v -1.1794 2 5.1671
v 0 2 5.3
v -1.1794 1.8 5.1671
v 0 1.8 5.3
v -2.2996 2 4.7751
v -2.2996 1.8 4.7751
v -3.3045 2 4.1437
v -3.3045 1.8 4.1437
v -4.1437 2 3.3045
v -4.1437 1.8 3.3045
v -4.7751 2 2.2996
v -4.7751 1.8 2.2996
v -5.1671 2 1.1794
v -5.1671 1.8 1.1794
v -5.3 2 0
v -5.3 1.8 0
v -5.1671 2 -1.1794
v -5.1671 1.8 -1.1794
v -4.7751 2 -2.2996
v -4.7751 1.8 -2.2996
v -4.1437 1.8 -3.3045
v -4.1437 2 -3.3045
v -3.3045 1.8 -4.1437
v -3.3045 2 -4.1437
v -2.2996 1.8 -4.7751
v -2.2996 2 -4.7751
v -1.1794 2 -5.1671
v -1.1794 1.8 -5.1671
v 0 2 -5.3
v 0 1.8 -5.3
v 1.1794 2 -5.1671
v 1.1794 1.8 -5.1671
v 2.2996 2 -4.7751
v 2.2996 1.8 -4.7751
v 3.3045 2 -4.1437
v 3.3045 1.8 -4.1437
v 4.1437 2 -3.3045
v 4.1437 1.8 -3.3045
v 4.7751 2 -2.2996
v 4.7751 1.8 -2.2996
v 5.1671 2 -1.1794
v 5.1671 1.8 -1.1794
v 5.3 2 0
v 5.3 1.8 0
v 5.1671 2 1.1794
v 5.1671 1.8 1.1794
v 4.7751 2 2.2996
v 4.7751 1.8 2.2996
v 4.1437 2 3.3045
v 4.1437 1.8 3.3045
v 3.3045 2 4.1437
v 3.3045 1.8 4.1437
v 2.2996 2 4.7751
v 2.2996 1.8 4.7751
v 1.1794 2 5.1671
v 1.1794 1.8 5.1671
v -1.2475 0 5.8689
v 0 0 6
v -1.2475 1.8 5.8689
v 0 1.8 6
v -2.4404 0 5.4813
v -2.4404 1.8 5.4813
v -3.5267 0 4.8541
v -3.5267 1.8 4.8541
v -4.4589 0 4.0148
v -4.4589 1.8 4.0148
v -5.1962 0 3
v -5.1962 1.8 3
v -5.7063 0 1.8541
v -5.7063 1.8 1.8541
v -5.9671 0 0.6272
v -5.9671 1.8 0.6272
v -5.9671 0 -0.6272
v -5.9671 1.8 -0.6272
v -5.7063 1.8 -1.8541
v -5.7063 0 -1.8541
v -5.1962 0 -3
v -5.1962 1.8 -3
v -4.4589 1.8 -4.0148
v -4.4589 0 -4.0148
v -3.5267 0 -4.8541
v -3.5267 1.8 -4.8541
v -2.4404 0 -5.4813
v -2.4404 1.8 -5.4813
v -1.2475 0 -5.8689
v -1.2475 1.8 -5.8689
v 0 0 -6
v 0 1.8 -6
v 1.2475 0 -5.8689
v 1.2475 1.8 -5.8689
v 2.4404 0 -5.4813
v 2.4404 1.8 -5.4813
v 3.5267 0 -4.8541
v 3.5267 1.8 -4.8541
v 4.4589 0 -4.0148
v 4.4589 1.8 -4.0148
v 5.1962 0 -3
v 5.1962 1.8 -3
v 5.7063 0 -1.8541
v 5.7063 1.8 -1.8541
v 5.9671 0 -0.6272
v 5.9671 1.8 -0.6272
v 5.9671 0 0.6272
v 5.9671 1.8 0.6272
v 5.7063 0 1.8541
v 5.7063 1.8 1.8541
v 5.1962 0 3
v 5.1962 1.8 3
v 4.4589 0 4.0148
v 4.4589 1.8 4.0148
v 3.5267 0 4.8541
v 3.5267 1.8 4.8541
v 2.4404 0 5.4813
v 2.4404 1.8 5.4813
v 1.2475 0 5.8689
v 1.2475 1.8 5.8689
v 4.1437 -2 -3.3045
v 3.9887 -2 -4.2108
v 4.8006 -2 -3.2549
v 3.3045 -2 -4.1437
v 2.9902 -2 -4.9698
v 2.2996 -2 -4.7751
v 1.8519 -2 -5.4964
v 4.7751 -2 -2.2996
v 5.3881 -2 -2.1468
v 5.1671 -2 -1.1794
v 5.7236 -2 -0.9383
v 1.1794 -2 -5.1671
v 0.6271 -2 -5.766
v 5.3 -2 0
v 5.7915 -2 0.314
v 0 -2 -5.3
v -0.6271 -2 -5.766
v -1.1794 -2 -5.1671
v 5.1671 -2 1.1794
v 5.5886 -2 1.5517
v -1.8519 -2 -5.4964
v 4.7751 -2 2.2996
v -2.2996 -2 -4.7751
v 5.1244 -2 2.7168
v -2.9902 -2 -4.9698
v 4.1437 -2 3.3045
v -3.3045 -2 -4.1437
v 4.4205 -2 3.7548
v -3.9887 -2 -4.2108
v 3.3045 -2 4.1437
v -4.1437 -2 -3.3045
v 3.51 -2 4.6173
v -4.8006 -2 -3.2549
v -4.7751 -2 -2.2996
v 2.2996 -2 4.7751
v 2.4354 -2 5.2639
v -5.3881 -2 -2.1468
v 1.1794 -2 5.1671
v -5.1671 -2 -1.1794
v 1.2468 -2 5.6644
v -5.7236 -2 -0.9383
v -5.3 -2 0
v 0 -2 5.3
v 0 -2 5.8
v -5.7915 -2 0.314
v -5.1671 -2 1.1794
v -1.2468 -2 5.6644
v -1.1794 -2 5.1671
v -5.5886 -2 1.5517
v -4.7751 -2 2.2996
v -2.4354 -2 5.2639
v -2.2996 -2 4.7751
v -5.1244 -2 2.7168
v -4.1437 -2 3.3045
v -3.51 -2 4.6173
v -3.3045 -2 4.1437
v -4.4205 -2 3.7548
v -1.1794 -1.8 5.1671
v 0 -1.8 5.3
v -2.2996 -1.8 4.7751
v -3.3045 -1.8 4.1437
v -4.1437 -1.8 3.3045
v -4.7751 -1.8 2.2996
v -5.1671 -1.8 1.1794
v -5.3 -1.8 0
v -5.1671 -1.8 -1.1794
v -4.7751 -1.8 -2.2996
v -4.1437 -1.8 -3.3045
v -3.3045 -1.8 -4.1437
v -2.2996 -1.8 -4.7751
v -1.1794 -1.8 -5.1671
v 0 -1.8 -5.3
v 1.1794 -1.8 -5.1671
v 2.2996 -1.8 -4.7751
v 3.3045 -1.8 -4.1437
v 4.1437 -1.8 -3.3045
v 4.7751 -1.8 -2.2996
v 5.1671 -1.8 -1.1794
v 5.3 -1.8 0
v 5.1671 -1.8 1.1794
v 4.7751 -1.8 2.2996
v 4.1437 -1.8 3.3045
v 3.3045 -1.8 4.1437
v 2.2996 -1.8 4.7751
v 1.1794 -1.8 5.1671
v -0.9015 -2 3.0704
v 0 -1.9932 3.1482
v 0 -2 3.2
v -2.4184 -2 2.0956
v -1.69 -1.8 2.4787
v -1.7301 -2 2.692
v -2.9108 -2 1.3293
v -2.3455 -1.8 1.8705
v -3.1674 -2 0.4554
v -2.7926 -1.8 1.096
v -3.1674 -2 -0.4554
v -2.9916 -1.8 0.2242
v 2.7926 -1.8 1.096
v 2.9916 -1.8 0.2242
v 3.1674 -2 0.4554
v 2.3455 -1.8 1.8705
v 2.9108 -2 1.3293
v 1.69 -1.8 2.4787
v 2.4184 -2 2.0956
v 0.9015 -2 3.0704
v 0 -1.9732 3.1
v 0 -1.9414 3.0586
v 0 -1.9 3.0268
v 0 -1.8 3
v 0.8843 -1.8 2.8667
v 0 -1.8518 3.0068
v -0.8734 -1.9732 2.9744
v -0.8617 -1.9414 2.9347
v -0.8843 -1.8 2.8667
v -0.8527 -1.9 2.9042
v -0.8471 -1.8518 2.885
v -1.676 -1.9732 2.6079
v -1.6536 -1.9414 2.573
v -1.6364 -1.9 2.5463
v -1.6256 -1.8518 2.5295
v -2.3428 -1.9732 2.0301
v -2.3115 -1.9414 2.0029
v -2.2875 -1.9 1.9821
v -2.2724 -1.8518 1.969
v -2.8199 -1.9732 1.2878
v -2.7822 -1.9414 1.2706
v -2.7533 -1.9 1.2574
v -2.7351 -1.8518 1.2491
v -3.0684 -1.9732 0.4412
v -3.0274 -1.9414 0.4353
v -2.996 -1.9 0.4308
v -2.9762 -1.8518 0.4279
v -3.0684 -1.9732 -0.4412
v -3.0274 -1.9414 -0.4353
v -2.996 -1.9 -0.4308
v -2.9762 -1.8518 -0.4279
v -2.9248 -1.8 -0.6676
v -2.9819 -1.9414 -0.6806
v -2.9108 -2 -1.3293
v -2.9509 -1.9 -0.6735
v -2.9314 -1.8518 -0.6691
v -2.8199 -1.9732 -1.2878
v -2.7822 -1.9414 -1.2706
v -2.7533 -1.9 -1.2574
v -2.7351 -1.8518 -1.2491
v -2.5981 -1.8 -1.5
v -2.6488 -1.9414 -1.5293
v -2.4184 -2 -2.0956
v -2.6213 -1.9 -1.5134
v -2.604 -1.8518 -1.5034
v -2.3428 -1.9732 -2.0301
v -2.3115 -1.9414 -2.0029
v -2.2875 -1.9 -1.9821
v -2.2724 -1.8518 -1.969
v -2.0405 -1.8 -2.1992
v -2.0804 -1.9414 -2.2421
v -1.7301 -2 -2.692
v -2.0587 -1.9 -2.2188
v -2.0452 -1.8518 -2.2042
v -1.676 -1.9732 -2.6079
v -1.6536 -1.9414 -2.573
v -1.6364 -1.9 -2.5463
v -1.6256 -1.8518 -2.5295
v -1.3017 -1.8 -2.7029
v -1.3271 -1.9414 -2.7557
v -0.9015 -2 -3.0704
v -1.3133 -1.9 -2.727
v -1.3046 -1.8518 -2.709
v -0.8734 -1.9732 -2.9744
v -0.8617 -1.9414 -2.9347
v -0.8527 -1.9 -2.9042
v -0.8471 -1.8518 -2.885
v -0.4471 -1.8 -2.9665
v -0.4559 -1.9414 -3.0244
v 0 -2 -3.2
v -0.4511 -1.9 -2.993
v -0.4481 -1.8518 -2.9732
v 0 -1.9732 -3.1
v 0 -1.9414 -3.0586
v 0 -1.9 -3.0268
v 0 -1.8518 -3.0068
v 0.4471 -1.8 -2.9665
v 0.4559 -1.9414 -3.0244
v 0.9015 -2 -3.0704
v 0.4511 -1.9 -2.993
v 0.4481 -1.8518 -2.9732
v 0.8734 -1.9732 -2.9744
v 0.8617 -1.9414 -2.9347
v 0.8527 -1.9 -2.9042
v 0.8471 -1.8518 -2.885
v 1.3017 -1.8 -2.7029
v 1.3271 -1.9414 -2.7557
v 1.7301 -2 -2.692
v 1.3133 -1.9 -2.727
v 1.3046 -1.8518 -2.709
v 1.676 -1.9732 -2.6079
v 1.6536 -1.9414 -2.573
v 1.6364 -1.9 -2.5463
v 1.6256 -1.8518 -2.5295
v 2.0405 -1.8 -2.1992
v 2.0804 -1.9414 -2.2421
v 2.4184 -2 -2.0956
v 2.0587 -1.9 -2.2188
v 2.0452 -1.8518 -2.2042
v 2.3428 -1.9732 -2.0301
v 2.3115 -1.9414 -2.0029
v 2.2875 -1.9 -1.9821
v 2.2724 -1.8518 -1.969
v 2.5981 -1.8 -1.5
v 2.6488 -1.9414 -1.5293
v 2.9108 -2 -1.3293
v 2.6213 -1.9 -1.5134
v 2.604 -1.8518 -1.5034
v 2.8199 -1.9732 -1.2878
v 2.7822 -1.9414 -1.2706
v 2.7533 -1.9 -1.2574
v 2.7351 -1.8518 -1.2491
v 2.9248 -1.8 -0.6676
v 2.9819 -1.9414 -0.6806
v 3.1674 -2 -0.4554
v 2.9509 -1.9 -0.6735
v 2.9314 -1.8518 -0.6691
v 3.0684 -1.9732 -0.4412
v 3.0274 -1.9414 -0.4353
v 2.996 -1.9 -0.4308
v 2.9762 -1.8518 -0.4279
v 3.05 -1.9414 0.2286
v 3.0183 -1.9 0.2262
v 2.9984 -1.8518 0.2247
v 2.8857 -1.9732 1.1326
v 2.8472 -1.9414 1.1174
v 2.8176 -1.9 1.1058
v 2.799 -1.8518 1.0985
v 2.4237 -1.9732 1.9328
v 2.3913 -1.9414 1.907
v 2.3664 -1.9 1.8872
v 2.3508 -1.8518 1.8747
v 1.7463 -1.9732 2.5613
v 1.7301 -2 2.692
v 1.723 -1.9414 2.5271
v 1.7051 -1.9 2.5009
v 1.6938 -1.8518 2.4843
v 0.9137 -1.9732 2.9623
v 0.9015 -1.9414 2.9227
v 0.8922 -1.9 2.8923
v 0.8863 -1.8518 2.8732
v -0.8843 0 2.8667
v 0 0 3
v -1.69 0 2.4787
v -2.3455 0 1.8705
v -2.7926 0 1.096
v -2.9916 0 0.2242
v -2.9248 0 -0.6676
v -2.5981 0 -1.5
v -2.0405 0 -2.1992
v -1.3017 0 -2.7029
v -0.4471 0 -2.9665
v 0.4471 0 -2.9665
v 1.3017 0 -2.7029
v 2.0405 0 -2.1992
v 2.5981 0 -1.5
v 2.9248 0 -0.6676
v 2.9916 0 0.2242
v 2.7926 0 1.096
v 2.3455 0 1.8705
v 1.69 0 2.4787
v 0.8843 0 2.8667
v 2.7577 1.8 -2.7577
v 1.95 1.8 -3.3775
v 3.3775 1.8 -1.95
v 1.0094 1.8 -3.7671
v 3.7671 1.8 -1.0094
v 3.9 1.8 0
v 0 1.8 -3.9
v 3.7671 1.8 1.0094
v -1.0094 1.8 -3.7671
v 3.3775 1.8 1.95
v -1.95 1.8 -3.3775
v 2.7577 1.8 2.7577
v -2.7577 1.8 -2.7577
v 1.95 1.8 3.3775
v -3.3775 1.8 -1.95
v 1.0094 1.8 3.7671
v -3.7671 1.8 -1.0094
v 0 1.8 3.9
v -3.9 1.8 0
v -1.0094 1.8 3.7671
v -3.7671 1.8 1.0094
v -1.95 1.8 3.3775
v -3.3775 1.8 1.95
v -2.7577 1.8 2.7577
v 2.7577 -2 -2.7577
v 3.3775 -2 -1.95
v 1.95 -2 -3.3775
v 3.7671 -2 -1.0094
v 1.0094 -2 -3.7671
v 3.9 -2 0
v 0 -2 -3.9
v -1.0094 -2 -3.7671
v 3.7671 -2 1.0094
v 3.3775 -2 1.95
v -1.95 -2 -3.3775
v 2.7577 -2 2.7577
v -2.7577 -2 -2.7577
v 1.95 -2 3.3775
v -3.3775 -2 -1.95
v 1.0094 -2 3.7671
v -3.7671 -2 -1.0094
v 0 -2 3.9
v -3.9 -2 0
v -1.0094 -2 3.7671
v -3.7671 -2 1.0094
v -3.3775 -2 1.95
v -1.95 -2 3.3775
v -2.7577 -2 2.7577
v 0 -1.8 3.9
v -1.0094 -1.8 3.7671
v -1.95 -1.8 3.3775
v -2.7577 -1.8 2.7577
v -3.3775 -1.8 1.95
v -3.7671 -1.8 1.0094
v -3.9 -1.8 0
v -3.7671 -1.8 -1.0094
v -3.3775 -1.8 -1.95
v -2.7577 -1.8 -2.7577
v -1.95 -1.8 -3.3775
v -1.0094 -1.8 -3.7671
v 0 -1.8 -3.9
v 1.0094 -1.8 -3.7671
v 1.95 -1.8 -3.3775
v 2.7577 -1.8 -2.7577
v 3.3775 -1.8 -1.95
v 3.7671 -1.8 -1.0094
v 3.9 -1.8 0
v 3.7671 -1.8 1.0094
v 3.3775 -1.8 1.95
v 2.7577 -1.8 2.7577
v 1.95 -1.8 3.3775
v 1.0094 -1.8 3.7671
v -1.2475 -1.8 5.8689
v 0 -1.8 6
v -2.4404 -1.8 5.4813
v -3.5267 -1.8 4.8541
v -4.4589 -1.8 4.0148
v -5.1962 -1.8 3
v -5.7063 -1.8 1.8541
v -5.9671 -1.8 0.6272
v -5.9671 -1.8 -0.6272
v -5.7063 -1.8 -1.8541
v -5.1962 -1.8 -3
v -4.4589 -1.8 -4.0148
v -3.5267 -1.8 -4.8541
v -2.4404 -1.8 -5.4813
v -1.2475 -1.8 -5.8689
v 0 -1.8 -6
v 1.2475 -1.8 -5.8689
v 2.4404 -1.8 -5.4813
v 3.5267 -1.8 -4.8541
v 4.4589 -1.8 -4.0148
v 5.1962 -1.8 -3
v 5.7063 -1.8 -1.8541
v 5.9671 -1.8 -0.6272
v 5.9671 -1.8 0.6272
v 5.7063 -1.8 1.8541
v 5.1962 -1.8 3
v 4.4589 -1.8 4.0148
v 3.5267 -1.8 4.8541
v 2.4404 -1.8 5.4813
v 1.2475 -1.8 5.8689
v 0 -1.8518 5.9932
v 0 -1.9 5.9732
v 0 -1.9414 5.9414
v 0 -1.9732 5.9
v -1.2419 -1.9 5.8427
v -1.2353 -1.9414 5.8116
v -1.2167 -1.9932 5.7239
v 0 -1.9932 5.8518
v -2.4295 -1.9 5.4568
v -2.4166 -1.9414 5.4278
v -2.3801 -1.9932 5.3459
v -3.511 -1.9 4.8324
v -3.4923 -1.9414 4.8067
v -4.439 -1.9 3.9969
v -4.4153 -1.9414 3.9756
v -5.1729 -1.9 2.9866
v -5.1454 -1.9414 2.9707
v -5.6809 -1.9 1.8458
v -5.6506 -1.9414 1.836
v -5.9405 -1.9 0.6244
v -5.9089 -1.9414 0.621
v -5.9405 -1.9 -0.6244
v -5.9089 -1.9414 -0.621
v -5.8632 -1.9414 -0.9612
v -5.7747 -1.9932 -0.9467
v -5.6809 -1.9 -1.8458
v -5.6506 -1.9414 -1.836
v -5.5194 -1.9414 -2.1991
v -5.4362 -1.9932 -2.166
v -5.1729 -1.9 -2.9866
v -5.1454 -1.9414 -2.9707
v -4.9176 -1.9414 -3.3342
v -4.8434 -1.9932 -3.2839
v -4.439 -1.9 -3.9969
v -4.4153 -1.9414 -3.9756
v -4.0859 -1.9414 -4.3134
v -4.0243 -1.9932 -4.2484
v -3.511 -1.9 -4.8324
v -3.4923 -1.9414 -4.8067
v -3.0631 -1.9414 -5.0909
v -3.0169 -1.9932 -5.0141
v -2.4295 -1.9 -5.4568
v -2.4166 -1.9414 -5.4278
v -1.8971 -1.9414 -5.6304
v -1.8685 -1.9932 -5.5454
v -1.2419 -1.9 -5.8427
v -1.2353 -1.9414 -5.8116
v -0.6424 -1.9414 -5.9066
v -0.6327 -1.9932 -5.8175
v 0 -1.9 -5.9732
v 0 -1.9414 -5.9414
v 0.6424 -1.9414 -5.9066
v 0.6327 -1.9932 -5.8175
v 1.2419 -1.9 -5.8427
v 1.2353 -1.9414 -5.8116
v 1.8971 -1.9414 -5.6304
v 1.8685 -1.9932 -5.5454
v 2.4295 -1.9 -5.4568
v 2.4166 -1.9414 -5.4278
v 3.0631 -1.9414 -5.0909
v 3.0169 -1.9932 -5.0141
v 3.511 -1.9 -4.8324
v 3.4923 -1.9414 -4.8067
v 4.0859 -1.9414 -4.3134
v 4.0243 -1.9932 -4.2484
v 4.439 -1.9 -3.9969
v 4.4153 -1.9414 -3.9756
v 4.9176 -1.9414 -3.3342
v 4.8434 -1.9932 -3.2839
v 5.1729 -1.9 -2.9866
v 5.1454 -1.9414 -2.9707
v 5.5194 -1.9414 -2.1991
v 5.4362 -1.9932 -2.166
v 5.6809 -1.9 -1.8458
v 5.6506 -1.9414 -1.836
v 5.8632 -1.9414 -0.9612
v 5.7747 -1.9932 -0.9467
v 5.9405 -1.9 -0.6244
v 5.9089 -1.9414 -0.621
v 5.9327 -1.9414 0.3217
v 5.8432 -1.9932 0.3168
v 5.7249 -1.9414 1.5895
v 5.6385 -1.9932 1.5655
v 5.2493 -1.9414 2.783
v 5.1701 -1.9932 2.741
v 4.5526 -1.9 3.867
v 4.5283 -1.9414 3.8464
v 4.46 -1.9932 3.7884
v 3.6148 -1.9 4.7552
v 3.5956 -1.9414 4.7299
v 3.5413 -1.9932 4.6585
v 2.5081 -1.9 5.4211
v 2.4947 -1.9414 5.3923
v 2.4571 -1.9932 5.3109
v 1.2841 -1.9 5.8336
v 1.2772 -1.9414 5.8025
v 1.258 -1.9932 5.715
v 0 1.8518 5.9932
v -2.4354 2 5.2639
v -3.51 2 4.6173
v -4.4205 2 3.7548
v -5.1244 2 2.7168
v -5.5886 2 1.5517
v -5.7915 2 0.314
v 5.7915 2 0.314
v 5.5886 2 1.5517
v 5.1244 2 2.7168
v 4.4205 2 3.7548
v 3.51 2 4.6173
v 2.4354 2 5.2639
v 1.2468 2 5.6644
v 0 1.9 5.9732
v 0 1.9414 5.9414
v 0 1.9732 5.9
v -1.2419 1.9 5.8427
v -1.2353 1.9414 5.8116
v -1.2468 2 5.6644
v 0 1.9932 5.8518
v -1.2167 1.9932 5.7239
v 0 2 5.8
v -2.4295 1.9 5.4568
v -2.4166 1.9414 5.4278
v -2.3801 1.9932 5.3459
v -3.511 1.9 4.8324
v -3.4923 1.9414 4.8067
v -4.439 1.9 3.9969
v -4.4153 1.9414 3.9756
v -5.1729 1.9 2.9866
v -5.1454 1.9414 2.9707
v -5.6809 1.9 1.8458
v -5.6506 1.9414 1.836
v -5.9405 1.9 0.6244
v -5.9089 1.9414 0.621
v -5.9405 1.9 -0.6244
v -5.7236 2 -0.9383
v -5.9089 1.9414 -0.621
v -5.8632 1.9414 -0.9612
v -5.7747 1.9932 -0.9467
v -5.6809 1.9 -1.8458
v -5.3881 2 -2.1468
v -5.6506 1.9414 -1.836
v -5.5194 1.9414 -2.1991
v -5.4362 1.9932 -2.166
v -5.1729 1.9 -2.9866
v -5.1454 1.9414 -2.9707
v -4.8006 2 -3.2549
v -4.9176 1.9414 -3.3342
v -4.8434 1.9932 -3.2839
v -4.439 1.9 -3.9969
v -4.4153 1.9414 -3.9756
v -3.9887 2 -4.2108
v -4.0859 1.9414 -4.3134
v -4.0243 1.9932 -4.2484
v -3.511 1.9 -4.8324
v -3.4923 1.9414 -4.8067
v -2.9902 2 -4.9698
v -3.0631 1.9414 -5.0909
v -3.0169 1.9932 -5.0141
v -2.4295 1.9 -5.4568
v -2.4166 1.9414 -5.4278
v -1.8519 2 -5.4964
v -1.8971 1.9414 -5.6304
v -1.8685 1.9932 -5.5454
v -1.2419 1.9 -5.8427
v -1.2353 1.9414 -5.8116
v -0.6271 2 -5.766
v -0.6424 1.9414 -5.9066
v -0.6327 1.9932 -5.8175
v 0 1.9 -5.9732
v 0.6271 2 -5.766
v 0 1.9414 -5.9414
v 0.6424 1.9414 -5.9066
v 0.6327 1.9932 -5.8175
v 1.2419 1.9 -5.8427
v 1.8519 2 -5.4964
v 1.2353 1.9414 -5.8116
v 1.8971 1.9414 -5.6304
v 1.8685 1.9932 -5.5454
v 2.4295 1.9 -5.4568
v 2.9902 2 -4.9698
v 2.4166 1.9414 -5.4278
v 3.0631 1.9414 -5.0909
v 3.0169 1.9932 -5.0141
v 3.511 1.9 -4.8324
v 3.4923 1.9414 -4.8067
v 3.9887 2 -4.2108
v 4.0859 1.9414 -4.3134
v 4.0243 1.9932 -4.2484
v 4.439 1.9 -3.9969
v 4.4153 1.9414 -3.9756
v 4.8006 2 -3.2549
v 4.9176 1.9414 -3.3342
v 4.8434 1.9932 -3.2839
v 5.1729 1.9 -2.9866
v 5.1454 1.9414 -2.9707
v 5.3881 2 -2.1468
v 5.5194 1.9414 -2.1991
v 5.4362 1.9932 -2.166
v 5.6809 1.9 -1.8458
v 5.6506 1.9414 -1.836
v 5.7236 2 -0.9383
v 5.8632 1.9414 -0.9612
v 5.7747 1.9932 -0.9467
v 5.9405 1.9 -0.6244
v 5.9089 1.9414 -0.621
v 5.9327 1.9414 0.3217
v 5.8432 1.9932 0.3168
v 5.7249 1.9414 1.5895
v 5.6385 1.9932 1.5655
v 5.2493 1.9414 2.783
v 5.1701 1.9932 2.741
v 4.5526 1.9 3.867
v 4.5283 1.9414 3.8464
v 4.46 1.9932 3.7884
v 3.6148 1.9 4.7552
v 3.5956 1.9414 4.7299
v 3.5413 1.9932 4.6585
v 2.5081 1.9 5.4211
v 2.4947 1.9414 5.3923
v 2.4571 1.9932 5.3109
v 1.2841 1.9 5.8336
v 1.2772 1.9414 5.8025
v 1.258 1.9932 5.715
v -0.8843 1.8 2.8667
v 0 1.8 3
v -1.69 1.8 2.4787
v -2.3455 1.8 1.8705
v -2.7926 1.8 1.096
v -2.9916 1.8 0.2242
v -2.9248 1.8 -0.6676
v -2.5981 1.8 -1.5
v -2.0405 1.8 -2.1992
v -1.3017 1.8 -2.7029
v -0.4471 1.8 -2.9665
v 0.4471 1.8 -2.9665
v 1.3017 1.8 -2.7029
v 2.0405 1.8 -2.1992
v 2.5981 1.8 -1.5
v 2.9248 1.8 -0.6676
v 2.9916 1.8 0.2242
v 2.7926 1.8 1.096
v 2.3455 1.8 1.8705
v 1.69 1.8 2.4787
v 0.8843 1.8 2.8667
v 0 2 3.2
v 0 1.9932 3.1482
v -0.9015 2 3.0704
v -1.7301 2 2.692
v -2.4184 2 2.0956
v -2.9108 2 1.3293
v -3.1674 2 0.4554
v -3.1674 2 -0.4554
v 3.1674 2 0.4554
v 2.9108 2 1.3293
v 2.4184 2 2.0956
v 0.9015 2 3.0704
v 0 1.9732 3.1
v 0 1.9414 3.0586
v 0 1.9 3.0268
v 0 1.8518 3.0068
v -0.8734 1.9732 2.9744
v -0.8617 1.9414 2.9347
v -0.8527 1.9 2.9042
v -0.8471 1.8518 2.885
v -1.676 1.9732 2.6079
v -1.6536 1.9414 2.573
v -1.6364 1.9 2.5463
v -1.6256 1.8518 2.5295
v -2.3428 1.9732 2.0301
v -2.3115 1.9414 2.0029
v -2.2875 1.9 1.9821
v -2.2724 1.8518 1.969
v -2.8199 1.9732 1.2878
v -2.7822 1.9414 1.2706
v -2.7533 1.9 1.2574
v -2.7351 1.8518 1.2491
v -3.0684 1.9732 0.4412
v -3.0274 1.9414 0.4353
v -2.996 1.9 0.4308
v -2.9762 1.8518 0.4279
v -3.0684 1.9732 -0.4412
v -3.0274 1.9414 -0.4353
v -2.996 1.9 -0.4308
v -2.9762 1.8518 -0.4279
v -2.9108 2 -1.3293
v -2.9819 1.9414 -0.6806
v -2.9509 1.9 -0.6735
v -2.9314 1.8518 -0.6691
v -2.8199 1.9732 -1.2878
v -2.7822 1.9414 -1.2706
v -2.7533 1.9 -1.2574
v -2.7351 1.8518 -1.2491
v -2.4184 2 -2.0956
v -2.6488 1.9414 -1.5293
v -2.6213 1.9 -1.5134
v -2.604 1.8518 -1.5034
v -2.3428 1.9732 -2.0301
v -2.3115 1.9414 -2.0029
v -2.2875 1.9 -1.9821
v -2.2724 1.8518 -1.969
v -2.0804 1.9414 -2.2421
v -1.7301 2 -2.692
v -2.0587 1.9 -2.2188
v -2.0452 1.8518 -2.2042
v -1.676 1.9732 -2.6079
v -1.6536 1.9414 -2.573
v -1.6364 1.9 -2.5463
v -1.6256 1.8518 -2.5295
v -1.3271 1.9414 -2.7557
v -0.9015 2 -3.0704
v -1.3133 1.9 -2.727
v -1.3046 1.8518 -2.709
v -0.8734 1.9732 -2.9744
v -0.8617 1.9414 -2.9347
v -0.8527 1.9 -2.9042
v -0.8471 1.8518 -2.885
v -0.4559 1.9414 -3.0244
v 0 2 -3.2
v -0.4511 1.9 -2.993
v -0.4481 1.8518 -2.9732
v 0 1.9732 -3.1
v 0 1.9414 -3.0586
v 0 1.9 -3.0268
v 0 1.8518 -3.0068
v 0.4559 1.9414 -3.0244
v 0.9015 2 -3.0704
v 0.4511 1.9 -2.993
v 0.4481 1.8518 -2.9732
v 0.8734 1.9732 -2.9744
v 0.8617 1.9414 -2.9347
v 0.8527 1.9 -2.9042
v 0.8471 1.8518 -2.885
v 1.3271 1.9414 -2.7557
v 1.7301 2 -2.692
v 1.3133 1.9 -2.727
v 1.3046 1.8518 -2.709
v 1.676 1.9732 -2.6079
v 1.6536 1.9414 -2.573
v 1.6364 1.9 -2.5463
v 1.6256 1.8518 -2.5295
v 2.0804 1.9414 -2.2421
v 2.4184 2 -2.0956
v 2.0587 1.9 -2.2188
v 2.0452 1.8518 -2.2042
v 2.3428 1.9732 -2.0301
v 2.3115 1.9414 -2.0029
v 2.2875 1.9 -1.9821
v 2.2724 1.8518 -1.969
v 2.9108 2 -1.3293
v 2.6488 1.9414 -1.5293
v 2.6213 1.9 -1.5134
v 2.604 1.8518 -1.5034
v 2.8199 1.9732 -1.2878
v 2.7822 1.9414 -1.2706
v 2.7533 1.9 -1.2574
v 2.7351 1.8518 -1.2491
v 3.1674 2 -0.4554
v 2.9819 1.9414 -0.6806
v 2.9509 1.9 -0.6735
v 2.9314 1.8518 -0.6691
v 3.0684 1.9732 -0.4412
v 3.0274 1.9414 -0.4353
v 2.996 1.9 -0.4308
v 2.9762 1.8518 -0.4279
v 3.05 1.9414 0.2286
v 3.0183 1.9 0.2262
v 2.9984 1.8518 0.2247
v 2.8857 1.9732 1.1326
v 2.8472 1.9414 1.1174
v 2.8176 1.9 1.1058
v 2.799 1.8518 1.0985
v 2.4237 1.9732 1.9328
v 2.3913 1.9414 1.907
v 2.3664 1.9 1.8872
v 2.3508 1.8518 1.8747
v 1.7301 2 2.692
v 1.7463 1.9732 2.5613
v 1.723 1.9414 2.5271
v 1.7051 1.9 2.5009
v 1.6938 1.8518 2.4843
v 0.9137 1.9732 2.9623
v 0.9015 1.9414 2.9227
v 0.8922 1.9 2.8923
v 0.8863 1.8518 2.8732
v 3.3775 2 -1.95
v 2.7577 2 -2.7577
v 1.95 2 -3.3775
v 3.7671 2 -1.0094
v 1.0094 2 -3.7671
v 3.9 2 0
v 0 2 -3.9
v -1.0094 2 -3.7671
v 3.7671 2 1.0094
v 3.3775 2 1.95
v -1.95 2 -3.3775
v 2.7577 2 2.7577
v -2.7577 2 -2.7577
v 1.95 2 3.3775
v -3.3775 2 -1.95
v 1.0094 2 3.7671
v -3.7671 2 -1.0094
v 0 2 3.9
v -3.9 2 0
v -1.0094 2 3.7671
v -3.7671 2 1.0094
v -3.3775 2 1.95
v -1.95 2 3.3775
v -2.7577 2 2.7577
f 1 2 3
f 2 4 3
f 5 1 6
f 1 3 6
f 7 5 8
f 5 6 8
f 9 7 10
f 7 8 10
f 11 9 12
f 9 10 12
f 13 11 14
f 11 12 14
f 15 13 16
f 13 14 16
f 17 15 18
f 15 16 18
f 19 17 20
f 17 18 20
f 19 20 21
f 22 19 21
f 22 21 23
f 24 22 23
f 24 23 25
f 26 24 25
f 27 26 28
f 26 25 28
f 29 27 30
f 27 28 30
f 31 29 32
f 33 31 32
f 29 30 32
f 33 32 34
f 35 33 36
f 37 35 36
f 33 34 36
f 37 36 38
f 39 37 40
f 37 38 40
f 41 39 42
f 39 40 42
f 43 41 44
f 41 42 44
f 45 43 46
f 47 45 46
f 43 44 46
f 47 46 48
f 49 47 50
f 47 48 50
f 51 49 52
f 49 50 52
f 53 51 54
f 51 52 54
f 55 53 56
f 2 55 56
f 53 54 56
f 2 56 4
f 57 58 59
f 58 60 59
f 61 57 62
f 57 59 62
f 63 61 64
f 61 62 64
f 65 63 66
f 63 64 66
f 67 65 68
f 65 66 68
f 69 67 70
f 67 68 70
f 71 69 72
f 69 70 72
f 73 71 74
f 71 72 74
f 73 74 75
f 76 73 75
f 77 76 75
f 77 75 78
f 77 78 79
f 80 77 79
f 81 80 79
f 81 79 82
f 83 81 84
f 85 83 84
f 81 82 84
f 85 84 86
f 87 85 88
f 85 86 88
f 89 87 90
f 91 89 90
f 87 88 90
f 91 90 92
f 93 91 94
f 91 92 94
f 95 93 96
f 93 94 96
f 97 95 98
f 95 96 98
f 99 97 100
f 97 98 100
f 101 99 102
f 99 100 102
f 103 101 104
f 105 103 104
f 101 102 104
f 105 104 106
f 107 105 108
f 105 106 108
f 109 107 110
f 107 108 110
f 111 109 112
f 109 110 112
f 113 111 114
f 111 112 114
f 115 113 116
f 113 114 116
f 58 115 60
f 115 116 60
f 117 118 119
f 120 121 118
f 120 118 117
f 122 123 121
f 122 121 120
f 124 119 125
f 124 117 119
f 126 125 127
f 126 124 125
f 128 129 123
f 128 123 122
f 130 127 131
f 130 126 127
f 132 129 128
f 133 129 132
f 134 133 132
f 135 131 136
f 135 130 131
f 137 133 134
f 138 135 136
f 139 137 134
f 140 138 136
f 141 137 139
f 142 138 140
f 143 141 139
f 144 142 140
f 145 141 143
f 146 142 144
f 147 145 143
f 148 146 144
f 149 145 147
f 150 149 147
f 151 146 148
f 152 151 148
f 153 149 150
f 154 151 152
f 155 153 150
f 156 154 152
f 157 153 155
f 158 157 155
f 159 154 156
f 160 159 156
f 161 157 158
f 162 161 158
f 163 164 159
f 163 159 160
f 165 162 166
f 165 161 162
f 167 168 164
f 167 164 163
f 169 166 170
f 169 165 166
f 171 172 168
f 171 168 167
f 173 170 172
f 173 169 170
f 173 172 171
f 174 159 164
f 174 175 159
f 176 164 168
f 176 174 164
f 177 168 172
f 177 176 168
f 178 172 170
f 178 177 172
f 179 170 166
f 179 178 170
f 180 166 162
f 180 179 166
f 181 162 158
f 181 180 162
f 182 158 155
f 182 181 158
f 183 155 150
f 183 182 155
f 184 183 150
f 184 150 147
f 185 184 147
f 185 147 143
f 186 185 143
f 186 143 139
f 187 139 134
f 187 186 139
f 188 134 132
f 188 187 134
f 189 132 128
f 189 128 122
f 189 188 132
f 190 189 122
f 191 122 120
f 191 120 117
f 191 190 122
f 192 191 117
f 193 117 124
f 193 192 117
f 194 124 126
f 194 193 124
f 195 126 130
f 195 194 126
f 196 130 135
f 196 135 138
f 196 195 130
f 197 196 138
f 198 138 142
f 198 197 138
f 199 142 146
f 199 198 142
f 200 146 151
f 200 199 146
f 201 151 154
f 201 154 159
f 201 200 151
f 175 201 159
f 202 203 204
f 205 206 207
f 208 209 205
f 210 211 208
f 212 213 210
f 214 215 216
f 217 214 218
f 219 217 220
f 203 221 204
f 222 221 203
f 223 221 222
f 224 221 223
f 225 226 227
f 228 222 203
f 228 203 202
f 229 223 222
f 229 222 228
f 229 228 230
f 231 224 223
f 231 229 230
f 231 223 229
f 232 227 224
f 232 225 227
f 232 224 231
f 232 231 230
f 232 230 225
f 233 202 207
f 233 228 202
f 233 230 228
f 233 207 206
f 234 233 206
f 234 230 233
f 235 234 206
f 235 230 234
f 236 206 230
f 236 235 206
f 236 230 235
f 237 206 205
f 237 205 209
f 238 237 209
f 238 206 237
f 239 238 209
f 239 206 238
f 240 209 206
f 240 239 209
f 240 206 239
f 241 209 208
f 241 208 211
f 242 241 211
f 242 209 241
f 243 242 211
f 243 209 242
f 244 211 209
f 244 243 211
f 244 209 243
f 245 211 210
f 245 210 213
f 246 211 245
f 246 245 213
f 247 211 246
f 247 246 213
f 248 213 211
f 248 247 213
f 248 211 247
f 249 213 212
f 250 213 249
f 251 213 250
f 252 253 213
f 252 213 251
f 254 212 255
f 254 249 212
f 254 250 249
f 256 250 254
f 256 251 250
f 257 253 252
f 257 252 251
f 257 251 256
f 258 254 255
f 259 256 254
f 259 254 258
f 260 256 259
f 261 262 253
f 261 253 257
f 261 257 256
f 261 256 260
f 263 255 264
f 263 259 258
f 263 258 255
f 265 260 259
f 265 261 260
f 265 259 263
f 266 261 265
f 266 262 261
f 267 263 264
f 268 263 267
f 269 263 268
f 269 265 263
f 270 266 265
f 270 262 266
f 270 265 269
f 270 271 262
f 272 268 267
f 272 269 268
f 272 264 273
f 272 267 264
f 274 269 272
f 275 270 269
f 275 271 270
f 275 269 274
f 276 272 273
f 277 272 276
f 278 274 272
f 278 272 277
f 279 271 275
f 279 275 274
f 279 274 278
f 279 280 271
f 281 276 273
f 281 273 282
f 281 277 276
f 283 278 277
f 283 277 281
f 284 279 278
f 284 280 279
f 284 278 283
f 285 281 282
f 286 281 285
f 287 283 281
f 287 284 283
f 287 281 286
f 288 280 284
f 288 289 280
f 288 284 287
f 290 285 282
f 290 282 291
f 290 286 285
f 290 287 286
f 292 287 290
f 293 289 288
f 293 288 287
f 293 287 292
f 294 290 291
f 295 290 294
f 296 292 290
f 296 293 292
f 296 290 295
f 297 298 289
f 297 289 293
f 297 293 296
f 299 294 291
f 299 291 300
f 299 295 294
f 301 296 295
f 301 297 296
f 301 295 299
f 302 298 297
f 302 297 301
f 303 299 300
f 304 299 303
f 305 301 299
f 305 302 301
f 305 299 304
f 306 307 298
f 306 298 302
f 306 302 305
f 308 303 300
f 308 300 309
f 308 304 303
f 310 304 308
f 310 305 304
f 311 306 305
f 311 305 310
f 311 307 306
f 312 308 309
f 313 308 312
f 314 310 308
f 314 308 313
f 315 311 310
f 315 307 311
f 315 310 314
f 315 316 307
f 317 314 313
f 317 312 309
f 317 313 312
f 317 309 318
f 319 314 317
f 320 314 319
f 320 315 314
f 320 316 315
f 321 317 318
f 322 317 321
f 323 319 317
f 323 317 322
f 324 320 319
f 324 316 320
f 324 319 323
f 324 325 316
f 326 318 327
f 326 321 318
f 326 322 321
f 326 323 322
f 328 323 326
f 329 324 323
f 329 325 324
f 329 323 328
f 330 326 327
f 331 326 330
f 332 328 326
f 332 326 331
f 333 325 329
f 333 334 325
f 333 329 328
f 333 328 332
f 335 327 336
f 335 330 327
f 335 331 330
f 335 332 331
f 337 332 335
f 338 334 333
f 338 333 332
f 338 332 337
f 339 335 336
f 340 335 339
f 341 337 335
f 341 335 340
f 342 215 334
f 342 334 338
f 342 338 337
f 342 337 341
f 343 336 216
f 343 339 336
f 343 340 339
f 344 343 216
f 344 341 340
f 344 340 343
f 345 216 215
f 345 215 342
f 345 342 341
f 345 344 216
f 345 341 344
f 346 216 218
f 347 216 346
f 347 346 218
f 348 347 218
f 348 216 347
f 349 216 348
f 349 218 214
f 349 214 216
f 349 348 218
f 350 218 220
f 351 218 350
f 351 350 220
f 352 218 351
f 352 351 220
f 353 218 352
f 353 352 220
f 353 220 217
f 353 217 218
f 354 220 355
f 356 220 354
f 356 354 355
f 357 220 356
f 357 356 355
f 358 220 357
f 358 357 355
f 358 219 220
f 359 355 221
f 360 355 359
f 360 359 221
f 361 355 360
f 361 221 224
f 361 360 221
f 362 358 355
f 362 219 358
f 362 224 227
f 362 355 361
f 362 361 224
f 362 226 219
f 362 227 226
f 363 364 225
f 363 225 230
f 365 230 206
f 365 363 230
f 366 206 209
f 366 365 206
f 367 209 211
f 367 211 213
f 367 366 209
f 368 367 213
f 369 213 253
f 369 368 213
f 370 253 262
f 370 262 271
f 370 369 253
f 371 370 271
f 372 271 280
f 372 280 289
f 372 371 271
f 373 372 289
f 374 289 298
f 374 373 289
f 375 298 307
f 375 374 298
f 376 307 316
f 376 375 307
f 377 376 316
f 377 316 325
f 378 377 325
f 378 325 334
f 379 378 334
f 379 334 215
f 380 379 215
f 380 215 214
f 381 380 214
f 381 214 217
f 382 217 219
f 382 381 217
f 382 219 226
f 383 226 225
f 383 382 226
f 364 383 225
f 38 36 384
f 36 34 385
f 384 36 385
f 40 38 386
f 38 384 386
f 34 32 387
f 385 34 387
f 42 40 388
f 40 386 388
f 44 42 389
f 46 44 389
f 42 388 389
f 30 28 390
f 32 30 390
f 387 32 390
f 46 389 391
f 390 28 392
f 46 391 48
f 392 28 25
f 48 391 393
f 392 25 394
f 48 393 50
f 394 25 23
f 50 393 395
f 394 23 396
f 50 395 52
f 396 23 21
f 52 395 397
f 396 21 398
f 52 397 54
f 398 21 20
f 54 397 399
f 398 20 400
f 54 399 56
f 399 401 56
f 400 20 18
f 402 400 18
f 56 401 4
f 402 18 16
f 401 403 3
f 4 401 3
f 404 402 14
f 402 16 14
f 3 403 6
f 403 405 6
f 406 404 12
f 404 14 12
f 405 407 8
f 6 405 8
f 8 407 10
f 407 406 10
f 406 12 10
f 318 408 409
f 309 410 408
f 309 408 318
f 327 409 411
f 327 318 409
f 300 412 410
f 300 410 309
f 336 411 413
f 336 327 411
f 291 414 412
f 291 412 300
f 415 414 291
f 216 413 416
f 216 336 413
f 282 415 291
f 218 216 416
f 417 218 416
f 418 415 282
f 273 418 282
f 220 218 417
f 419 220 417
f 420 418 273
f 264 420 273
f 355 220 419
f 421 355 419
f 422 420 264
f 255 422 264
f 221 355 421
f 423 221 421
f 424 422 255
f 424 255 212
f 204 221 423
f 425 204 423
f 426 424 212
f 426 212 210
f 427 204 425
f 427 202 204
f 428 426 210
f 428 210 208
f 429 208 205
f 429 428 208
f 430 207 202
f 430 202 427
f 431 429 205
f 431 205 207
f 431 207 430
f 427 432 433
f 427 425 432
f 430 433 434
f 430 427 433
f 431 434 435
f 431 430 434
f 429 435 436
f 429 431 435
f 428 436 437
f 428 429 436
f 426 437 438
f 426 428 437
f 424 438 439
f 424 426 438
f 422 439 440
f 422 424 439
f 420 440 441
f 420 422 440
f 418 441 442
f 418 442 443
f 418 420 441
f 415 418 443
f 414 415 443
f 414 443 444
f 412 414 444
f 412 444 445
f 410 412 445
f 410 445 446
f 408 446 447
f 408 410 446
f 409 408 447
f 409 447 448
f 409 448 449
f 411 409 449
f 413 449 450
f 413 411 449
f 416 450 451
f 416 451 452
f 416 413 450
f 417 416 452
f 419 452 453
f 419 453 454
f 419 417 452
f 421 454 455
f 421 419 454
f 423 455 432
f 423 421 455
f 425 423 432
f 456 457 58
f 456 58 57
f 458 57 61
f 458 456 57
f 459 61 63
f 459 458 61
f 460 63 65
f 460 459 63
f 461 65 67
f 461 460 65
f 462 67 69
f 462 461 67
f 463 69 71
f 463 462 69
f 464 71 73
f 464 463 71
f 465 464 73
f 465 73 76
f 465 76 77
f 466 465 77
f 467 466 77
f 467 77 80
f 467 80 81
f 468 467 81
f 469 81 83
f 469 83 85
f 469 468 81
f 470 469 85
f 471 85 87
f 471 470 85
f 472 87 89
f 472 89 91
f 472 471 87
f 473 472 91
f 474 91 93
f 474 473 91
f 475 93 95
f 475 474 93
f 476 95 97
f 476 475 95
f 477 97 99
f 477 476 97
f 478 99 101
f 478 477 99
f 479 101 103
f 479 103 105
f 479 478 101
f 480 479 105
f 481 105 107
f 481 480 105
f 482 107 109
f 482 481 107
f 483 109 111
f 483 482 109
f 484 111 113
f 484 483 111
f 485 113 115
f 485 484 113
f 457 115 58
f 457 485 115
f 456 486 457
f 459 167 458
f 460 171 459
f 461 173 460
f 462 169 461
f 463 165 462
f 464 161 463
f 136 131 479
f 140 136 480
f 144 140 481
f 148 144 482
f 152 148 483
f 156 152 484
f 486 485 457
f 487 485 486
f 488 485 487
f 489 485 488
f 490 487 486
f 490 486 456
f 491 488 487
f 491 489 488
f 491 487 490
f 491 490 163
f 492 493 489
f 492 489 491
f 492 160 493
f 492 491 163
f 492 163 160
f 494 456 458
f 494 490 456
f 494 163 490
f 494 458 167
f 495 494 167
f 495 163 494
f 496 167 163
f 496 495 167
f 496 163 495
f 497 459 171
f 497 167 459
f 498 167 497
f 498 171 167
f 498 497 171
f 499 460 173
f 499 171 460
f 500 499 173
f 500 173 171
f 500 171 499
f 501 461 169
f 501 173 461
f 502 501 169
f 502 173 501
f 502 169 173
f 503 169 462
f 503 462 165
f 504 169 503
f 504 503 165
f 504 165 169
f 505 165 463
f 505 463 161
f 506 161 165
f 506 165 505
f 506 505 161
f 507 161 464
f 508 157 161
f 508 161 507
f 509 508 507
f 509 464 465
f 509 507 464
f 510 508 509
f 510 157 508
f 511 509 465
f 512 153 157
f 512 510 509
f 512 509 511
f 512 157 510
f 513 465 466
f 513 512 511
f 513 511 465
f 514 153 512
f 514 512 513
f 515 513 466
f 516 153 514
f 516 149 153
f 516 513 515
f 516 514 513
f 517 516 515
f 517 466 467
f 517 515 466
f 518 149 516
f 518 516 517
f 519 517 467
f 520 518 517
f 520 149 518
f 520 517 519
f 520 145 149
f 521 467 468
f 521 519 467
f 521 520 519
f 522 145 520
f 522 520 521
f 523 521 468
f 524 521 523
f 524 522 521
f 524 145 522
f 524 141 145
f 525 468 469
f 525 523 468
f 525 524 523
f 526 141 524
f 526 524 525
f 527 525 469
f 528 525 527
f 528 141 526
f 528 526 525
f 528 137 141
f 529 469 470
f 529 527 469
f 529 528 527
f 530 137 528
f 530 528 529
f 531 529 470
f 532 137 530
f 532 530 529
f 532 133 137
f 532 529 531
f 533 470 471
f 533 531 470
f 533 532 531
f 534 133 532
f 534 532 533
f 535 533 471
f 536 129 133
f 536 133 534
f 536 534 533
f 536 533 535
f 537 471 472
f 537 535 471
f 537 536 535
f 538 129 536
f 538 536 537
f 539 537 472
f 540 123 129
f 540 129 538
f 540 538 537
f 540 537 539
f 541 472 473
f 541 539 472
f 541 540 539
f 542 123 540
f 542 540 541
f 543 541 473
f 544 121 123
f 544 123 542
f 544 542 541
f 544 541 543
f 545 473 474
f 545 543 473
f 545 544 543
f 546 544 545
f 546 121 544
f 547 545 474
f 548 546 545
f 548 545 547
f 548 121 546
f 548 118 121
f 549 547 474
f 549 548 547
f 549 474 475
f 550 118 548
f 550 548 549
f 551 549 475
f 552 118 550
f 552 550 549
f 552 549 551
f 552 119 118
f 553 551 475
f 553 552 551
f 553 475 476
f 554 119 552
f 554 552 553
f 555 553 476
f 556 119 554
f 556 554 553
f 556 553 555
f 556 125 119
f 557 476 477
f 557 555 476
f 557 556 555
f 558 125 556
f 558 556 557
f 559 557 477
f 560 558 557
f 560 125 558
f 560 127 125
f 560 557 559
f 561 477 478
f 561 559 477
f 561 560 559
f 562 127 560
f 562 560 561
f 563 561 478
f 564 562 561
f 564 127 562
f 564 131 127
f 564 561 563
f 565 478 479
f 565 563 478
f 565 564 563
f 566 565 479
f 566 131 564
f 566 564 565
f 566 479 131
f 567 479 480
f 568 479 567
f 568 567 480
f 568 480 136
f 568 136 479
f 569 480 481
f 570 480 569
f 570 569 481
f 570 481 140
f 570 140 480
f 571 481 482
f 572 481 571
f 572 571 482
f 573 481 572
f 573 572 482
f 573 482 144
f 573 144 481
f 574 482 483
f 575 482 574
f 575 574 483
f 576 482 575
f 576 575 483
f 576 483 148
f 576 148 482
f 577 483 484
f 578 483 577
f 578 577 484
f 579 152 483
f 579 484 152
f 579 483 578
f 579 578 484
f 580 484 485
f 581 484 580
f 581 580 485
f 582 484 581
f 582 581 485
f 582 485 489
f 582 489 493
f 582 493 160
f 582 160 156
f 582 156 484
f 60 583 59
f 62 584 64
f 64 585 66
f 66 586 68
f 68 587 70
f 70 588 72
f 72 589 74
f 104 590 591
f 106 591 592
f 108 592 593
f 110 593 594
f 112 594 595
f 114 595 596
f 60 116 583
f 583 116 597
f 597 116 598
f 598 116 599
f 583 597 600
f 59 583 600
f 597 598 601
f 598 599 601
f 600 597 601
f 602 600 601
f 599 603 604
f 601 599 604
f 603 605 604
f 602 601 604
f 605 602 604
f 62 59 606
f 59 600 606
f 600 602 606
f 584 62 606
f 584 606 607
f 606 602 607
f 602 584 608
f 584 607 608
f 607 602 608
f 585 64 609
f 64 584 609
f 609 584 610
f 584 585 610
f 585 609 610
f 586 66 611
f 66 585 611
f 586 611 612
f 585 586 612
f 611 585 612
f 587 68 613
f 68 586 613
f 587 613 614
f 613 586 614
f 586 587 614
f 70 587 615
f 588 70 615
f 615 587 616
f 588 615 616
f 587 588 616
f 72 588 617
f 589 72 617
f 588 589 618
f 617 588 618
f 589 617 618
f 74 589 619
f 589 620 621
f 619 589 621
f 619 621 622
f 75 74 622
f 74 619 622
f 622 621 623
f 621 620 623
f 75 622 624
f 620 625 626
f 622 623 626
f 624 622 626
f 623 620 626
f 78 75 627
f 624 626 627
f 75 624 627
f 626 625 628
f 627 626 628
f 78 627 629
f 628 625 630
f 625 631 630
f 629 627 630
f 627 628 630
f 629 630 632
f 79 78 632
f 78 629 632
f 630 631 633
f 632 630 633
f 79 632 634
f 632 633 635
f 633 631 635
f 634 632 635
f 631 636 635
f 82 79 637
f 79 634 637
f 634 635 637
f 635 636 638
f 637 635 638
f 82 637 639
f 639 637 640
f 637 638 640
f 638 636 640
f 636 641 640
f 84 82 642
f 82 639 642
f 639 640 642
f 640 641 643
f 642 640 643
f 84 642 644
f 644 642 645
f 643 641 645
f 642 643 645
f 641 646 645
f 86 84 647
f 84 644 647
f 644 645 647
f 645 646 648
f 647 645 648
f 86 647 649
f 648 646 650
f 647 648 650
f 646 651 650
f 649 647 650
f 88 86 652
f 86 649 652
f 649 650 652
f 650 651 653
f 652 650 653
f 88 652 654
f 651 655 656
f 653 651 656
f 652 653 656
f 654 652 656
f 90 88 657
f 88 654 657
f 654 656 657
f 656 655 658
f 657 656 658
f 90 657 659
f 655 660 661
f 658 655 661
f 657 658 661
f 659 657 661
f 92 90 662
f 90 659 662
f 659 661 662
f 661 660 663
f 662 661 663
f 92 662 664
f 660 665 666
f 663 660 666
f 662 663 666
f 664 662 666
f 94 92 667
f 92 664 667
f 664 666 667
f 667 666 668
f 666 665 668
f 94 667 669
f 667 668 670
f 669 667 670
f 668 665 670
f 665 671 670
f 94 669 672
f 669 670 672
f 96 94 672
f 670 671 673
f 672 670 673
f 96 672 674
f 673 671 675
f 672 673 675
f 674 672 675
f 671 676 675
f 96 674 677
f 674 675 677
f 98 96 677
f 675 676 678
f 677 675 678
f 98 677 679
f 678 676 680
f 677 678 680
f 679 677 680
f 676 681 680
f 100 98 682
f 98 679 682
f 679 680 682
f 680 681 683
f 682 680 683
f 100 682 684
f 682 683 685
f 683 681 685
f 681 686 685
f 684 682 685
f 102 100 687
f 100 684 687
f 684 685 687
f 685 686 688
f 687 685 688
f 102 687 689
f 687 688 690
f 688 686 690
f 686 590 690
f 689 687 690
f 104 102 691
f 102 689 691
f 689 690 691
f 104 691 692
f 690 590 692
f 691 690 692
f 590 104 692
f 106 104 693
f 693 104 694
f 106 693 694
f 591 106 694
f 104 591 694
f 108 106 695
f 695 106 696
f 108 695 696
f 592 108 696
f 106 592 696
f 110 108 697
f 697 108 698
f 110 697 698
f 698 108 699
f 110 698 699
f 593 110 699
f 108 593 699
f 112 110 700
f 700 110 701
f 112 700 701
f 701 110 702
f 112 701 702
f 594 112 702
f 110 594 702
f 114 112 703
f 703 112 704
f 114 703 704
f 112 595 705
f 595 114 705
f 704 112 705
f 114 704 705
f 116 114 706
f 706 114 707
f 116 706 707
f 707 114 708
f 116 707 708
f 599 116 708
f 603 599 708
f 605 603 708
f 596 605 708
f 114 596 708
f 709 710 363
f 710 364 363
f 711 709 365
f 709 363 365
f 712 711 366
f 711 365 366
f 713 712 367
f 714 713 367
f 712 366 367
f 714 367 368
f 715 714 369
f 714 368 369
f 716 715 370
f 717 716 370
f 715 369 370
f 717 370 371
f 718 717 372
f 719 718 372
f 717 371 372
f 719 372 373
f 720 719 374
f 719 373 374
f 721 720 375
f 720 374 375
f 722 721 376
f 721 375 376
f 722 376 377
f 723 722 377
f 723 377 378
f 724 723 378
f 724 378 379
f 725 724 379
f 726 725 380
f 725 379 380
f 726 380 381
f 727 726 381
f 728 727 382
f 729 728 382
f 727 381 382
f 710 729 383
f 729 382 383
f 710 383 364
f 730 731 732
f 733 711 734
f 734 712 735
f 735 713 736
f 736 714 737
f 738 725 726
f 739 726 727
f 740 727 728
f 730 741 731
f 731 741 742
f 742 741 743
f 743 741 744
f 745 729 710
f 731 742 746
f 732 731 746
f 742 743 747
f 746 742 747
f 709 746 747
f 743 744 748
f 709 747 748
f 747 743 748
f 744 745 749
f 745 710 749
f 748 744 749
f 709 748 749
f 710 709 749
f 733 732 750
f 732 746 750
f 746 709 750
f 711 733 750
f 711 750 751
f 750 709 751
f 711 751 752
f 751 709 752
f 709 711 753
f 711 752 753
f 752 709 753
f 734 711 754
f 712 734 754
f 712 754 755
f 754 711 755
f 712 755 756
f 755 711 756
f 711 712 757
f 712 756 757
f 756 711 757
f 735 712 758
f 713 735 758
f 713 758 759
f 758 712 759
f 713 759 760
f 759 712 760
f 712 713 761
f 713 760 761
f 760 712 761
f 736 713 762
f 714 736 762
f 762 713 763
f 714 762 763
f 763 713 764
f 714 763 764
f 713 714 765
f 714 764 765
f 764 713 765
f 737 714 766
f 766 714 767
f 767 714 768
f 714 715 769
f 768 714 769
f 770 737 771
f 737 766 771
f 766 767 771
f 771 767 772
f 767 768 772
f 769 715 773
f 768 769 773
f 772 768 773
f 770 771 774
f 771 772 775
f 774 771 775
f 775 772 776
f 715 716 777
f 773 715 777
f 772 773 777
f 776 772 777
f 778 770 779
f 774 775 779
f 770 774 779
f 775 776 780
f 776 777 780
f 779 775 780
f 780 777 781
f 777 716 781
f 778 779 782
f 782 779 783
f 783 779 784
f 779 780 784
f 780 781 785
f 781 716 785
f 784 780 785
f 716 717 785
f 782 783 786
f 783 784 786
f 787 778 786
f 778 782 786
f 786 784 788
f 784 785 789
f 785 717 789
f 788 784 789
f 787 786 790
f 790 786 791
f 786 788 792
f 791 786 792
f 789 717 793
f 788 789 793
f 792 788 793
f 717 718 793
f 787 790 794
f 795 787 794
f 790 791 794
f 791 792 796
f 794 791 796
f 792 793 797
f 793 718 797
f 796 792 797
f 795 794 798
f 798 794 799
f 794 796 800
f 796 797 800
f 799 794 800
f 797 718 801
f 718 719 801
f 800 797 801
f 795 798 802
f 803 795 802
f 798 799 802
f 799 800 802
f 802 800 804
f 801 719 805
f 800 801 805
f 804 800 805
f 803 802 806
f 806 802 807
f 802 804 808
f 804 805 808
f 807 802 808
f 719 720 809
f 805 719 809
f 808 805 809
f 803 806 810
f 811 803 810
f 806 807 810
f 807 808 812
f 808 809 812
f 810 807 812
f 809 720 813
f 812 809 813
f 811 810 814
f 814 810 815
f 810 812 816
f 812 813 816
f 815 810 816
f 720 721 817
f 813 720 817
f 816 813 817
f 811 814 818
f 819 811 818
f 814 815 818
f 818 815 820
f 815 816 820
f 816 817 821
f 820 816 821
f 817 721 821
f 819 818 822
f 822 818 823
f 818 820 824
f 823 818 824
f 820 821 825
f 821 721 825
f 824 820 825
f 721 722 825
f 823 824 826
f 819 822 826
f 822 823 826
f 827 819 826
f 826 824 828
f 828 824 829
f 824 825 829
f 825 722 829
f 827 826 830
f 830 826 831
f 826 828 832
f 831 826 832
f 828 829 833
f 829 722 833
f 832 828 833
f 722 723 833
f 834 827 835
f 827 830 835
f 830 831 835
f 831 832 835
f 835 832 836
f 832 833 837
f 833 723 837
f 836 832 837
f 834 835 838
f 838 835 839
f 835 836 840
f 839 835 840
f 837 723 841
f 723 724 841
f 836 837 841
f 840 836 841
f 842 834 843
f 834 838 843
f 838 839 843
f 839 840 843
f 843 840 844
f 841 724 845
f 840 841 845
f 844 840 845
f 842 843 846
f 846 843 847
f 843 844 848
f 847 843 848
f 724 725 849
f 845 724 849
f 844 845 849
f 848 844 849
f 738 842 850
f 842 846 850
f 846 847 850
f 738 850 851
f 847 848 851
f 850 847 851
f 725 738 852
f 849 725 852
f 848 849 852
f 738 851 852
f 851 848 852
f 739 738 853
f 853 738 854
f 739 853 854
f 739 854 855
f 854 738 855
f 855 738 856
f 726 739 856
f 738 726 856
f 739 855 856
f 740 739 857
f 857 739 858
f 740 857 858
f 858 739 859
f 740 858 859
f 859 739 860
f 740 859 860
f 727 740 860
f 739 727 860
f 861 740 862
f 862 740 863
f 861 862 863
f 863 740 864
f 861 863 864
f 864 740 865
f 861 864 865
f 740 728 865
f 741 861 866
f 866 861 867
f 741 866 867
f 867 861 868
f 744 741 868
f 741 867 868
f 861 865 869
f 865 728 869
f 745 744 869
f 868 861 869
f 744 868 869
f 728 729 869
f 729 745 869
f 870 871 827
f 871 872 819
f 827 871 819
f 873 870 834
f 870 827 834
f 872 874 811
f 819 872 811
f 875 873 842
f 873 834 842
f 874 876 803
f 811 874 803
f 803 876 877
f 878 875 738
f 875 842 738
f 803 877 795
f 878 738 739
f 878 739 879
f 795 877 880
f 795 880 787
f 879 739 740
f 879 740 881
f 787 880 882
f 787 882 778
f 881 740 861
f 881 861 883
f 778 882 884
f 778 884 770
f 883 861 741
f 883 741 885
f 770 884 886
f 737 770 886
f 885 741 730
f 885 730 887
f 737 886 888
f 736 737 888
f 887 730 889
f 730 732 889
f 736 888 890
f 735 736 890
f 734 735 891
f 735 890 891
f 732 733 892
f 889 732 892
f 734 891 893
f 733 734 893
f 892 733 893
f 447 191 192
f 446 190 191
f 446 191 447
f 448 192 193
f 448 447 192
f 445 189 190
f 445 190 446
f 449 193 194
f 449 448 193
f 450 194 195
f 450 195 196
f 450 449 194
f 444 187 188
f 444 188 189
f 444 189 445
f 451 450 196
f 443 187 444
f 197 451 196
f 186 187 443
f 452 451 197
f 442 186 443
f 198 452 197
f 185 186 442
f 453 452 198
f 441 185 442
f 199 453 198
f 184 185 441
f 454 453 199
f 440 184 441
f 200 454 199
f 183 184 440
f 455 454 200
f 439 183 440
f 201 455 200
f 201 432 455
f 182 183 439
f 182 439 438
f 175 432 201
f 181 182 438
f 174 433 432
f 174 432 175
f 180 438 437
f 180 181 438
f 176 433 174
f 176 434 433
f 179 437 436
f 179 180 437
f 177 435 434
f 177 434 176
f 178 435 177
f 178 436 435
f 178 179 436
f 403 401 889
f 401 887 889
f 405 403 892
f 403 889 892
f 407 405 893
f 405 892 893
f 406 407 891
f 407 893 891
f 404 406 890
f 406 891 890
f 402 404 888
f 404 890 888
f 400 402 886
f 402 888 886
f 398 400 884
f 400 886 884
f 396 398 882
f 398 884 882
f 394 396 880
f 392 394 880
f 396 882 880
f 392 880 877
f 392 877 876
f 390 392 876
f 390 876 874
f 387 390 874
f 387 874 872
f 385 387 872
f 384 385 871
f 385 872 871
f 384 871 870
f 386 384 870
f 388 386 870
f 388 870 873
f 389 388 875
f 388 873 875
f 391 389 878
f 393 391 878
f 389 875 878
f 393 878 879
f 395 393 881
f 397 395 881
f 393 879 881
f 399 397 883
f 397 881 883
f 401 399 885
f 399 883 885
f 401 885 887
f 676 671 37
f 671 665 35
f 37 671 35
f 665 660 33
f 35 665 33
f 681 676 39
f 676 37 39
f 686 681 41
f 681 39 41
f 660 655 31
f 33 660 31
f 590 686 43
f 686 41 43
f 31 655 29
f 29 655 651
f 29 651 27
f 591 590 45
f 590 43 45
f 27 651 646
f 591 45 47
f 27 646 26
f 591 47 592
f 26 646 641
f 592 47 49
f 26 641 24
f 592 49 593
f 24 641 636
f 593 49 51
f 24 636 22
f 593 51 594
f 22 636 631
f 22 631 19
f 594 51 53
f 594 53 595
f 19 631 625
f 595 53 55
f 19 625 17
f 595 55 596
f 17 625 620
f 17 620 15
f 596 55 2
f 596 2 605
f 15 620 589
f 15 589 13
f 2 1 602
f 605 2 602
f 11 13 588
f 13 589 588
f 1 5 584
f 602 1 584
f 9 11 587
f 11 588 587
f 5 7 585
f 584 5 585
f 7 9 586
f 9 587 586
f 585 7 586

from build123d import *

# Parameters (mm, degrees)
FILLET1_R            = 0.2
FILLET1_OF_MIRROR1_R = 0.2


with BuildPart() as part:
    # Sketch1 → Revolve1 (revolve)
    with BuildSketch(Plane(origin=(0, 0, 0), x_dir=(0, 0, -1), z_dir=(1, 0, 0))):
        Polygon((-6, 0), (-6, 2), (-5.3, 2), (-5.3, 1.8), (-3.9, 1.8), (-3.9, 2), (-3, 2), (-3, 0), align=None)
    revolve1 = revolve(axis=Axis((0, 15.203883495, 0), (0, -1, 0)))

    # Fillet1
    fillet1_edges = [part.edges().sort_by_distance(p)[0] for p in [
        (0, 2, -3),
        (0, 2, -6),
    ]]
    fillet(fillet1_edges, radius=FILLET1_R)

    # Mirror1: Revolve1 across plane
    add(revolve1.mirror(Plane.ZX))

    # Fillet1 of Mirror1
    fillet1_of_mirror1_edges = [part.edges().sort_by_distance(p)[0] for p in [
        (0, -2, -3),
        (0, -2, -6),
    ]]
    fillet(fillet1_of_mirror1_edges, radius=FILLET1_OF_MIRROR1_R)


solid = part.part
